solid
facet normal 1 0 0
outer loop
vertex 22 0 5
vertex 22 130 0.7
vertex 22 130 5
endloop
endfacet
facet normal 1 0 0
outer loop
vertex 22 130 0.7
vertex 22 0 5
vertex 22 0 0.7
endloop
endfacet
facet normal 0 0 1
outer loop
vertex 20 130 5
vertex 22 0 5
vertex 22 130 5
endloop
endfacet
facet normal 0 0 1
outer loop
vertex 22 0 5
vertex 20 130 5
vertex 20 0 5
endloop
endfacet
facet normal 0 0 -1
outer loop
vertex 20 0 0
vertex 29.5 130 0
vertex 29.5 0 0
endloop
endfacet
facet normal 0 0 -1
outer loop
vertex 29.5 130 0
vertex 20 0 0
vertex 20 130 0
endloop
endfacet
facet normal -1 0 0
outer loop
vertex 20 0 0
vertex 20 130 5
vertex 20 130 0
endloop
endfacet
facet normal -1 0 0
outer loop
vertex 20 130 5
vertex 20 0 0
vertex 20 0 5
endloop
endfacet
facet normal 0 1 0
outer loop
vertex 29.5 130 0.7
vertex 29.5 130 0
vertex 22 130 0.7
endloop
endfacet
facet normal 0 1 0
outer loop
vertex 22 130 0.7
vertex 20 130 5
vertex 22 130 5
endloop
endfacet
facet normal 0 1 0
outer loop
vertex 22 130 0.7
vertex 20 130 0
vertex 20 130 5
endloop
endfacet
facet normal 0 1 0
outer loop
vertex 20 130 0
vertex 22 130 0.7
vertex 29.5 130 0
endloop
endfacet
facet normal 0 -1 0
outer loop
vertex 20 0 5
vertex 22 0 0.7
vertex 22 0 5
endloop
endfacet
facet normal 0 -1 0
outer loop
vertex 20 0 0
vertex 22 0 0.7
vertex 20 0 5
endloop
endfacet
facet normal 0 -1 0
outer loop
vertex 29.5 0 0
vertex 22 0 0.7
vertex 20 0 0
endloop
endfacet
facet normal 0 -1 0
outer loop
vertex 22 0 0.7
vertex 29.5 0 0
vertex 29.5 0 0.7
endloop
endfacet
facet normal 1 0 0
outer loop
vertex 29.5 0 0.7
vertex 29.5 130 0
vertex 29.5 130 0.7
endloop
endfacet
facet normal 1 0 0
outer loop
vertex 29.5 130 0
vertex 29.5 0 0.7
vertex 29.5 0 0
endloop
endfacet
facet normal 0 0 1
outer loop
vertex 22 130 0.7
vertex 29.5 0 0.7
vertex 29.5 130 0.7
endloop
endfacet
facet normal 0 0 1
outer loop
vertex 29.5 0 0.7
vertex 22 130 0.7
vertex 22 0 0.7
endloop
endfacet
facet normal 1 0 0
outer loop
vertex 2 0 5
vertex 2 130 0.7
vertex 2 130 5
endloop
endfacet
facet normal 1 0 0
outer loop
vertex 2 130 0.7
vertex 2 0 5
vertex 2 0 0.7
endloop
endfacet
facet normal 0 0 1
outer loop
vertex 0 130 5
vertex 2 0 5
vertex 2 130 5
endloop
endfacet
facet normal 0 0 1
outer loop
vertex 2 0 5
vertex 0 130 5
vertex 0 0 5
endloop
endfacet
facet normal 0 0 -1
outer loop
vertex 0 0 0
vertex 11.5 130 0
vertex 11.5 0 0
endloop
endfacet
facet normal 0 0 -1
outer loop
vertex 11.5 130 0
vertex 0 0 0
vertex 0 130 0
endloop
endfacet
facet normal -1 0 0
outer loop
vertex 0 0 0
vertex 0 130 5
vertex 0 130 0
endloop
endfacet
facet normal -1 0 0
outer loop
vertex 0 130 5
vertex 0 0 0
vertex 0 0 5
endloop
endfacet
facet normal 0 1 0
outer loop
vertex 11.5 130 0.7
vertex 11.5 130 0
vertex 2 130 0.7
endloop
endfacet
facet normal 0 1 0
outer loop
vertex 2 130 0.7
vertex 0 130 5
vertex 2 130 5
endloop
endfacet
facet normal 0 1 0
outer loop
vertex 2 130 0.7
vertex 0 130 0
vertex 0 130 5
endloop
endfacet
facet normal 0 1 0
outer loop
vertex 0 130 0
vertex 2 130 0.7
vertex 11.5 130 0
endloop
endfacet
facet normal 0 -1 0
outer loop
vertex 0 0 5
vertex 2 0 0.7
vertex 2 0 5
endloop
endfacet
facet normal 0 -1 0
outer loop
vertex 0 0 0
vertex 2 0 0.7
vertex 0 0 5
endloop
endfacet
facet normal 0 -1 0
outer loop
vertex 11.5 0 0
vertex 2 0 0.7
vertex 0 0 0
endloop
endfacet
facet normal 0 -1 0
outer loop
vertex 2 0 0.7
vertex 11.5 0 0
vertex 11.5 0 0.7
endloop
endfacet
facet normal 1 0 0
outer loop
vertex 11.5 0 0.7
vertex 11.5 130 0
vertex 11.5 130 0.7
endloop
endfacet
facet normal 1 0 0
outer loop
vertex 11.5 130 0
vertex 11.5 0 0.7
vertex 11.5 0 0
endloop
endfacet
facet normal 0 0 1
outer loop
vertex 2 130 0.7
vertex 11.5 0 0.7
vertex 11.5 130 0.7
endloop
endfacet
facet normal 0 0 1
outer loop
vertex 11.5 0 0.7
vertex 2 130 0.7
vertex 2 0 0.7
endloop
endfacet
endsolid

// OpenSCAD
cube([2,130,5]);
cube([11.5, 130, .7]);

translate([20,0,0]){
    cube([2,130,5]);
    cube([9.5,130,.7]);
}
